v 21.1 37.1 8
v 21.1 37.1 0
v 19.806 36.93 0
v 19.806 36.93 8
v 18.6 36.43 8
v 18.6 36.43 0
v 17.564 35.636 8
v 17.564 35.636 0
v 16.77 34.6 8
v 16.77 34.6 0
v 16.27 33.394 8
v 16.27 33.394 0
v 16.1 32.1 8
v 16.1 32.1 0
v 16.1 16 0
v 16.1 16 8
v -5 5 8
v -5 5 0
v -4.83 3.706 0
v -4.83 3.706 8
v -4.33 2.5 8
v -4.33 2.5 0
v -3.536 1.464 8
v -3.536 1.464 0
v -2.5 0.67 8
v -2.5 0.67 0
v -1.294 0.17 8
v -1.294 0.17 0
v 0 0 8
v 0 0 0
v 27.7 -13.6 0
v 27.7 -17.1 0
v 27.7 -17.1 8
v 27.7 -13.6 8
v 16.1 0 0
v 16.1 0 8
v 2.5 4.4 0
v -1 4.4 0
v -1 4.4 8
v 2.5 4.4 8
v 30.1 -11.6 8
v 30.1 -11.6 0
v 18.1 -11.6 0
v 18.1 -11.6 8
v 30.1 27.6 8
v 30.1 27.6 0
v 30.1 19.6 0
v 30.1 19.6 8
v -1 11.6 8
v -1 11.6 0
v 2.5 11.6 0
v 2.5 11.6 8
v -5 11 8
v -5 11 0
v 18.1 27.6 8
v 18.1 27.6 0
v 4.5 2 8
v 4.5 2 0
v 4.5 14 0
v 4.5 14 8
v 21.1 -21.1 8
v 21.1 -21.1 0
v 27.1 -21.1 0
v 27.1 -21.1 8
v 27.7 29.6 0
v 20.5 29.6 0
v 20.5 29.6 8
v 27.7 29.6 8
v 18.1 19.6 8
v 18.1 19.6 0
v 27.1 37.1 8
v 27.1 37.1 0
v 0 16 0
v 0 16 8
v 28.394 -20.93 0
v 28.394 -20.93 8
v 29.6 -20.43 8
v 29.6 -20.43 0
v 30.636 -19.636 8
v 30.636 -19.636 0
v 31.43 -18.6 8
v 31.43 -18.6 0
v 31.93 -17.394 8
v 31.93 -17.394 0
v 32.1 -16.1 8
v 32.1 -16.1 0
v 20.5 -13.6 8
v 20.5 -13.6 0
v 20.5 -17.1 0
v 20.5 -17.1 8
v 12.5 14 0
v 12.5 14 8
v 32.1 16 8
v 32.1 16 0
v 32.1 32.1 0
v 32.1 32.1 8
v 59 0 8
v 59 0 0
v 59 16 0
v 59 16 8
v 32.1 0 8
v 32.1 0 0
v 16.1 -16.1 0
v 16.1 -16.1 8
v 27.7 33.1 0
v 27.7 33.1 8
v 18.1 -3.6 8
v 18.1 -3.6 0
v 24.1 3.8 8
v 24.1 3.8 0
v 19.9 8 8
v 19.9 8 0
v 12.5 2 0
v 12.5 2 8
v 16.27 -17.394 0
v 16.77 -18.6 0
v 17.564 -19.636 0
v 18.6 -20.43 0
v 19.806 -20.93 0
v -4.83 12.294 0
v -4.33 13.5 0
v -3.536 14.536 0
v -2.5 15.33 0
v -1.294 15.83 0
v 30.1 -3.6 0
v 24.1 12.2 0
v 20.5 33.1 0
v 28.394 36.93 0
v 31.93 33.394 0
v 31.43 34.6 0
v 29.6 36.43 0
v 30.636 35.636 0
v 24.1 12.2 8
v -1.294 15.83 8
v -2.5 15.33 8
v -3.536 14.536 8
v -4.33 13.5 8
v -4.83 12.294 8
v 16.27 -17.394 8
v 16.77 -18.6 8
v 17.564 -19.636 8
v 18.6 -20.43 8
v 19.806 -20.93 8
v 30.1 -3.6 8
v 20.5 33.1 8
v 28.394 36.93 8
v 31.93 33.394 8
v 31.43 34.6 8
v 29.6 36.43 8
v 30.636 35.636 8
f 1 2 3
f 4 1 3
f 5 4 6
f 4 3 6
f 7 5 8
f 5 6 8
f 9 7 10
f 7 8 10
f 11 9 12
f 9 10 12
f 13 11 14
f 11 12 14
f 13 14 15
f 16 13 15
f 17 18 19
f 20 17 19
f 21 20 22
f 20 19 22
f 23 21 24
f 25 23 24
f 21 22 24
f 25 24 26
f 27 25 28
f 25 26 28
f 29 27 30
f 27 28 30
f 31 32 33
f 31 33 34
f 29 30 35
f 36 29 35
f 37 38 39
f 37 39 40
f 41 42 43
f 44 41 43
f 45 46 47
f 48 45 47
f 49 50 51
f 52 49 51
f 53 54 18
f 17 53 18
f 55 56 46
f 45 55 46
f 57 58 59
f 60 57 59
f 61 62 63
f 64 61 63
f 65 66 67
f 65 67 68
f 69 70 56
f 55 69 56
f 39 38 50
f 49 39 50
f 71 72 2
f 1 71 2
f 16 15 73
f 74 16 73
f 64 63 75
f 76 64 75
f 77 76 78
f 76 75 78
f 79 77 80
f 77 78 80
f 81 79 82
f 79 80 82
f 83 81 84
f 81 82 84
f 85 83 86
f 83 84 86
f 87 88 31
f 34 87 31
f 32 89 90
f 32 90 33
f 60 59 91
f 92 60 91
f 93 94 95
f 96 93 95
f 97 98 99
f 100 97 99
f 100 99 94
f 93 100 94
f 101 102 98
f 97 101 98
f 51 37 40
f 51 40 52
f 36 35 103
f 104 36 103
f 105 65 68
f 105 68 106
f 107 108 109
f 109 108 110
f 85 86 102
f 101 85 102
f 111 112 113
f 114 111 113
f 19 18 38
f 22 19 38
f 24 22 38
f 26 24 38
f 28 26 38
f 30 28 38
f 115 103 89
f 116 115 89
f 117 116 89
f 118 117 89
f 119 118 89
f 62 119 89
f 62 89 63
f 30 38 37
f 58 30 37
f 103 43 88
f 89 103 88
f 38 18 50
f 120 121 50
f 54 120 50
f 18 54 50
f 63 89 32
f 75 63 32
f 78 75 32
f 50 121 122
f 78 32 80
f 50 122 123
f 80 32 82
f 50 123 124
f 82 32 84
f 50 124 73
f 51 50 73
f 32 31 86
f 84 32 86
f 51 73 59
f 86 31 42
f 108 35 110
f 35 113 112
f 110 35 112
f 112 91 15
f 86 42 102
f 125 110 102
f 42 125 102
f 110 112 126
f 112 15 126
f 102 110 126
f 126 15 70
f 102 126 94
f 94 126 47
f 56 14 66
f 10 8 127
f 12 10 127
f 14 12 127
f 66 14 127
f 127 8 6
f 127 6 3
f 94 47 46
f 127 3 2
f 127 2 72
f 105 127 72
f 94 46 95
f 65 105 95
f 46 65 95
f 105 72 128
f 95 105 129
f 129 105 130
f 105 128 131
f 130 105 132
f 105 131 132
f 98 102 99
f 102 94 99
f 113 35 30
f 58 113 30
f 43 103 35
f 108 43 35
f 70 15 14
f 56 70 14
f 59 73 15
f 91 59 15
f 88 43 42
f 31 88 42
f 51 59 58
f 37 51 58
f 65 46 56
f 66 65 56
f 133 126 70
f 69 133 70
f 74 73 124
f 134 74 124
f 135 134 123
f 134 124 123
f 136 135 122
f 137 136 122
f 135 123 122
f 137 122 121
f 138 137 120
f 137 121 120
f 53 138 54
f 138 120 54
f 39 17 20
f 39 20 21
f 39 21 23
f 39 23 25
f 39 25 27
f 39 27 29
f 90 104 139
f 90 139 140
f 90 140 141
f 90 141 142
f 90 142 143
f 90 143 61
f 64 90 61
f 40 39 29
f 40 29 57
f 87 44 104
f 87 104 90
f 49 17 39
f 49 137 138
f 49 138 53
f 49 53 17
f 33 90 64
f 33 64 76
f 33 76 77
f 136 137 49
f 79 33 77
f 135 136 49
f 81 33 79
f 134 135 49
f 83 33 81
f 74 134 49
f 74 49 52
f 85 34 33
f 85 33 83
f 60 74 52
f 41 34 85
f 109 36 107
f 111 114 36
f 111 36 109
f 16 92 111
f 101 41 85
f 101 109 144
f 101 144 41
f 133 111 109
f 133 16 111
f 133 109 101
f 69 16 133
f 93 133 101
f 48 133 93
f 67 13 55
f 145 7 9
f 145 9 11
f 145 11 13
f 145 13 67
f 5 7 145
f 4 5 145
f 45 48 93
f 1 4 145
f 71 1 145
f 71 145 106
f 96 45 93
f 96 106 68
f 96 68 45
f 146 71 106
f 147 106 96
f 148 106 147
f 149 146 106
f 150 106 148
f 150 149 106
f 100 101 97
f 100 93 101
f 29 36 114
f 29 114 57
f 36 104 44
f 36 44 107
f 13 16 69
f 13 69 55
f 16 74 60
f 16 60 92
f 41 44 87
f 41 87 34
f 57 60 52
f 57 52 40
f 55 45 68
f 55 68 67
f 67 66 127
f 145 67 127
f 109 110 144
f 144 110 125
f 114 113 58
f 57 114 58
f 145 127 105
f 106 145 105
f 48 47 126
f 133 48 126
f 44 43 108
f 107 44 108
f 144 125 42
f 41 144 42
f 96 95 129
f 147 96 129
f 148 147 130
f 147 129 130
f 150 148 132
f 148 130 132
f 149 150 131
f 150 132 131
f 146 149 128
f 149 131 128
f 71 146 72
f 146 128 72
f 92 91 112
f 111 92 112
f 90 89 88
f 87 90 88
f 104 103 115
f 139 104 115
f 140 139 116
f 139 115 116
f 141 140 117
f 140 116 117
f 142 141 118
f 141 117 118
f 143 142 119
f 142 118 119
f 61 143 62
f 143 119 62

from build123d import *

# Parameters (mm, degrees)
F0_W     = 7.2
F0_H     = 3.5
F0_W_2   = 3.5
F0_H_2   = 7.2
F1_DEPTH = 8


with BuildPart() as f1:
    # F0 (on Top) → F1 (new body)
    with BuildSketch(Plane.XY):
        with BuildLine():
            ThreePointArc((-5, 5), (-3.535534, 1.464466), (0, 0))
            Line((0, 0), (16.1, 0))
            Line((16.1, 0), (16.1, -16.1))
            ThreePointArc((16.1, -16.1), (17.564466, -19.635534), (21.1, -21.1))
            Line((21.1, -21.1), (27.1, -21.1))
            ThreePointArc((27.1, -21.1), (30.635534, -19.635534), (32.1, -16.1))
            Line((32.1, -16.1), (32.1, 0))
            Line((32.1, 0), (59, 0))
            Line((59, 0), (59, 16))
            Line((59, 16), (32.1, 16))
            Line((32.1, 16), (32.1, 32.1))
            ThreePointArc((32.1, 32.1), (30.635534, 35.635534), (27.1, 37.1))
            Line((27.1, 37.1), (21.1, 37.1))
            ThreePointArc((21.1, 37.1), (17.564466, 35.635534), (16.1, 32.1))
            Line((16.1, 32.1), (16.1, 16))
            Line((16.1, 16), (0, 16))
            ThreePointArc((0, 16), (-3.535534, 14.535534), (-5, 11))
            Line((-5, 11), (-5, 5))
        make_face()
        with Locations((24.1, -15.35)):
            Rectangle(F0_W, F0_H, mode=Mode.SUBTRACT)
        with Locations((0.75, 8)):
            Rectangle(F0_W_2, F0_H_2, mode=Mode.SUBTRACT)
        Polygon((30.1, -3.6), (30.1, -11.6), (18.1, -11.6), (18.1, -3.6), (24.1, 3.8), align=None, mode=Mode.SUBTRACT)
        Polygon((12.5, 2), (4.5, 2), (4.5, 14), (12.5, 14), (19.9, 8), align=None, mode=Mode.SUBTRACT)
        Polygon((18.1, 19.6), (18.1, 27.6), (30.1, 27.6), (30.1, 19.6), (24.1, 12.2), align=None, mode=Mode.SUBTRACT)
        with Locations((24.1, 31.35)):
            Rectangle(F0_W, F0_H, mode=Mode.SUBTRACT)
    extrude(amount=F1_DEPTH)


solid = f1.part
